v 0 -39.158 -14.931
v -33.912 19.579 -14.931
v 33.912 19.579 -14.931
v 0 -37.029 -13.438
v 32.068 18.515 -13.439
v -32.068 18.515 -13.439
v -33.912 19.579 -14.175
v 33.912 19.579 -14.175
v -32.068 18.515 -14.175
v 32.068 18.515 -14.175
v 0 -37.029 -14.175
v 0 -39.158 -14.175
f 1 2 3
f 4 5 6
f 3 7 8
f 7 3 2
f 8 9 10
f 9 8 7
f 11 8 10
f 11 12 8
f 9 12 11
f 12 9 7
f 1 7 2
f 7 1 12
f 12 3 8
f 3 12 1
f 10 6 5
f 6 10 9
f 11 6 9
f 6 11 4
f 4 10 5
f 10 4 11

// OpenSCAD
arete = 73.515;
paroi = 1.5;
echelleReductionAjustementBouchon = 0.972;
r = 0.19; // résolution d'impression sur l'axe Z
tetra_sch = [3,3];
Cpi = 3.14159;
Cphi = (1+sqrt(5))/2;
Cepsilon = 0.00000001;

function tetra_ext_radius(a) =
    a/4*sqrt(6);

function tetra_int_radius(a) =
    a/12*sqrt(6);

function tetra_arete_from(radius) =
    radius*12/sqrt(6);

externalRadius = tetra_ext_radius(arete);
internalRadius = tetra_ext_radius(
                    tetra_arete_from(
                        tetra_int_radius(arete)-paroi));

echo(externalRadius);
echo(internalRadius);

//tetrahedron(arete);
//tetra_creux();
//decoupe_bouchon();
//corps_ouvert();
bouchon();
//trou();

module corps_ouvert() {
	difference() {
		tetra_creux();
		decoupe_bouchon();
	}
}

module bouchon() {
//    rotate([180, 0, 0])
	scale([echelleReductionAjustementBouchon, echelleReductionAjustementBouchon, 0.995])
	difference () {
        intersection() {
            tetra_creux();
            decoupe_bouchon(echelleReductionAjustementBouchon);
        }
	}
}

module tetra_creux() {
	difference() {
        tetrahedron(externalRadius);
        tetrahedron(internalRadius);
	}
}

module decoupe_bouchon(scale=1) {
    distance = tetra_int_radius(arete);
	rotate([0,0,30]) translate([0,0,-distance-2*r])
		cylinder(6*r, r=arete*0.548, $fn=3);
	rotate([0,0,30]) translate([0,0,-distance])
		cylinder(8*r, r=(arete-paroi)*0.529, $fn=3);
}


module tetrahedron(rad) {
    // create an instance of a spherical coordinate
    // long - rotation around z -axis
    // lat - latitude, starting at 0 == 'north pole'
    // rad - distance from center
    function sph(long, lat, rad=1) = [long, lat, rad];

    // Convert spherical to cartesian
    function sph_to_cart(s) = [
	clean(s[2]*sin(s[1])*cos(s[0])),

	clean(s[2]*sin(s[1])*sin(s[0])),

	clean(s[2]*cos(s[1]))
	];

    function sphu_from_cart(c, rad=1) = sph(
        atan2(c[1],c[0]),
        atan2(sqrt(c[0]*c[0]+c[1]*c[1]), c[2]),
        rad
        );

    tetra_cart = [
        [+1, +1, +1],
        [-1, -1, +1],
        [-1, +1, -1],
        [+1, -1, -1]
    ];

    function tetra_unit(rad=1) = [
        sph_to_cart(sphu_from_cart(tetra_cart[0], rad)),
        sph_to_cart(sphu_from_cart(tetra_cart[1], rad)),
        sph_to_cart(sphu_from_cart(tetra_cart[2], rad)),
        sph_to_cart(sphu_from_cart(tetra_cart[3], rad)),
        ];


    tetrafaces = [
        [0, 3, 1],
        [0,1,2],
        [2,1,3],
        [0,2,3]
    ];

    tetra_edges = [
        [0,1],
        [0,2],
        [0,3],
        [1,2],
        [1,3],
        [2,3],
        ];

    rotate([54.735, 0, 0])
    rotate([0, 0, 45])
    polyhedron(tetra_unit(rad), faces=tetrafaces);
}
//translate([0, 0, -17.7])
//cylinder(5,40,40);

function clean(n) = (n < 0) ? ((n < -Cepsilon) ? n : 0) :
	(n < Cepsilon) ? 0 : n;

function plat_dihedral(pq) = 2 * asin( cos(180/pq[1])/sin(180/pq[0]));

function plat_circumradius(pq, a) =
	(a/2)*
	tan(Cpi/pq[1])*
	tan(plat_dihedral(pq)/2);

function plat_midradius(pq, a) =
	(a/2)*
	cos(Cpi/pq[0])*
	tan(plat_dihedral(pq)/2);

function plat_inradius(pq,a) =
	a/(2*tan(Cpi/pq[0]))*
	sqrt((1-cos(plat_dihedral(pq)))/(1+cos(plat_dihedral(pq))));

function plat_a_from_inradius(pq, inradius) =
    inradius*(2*tan(Cpi/pq[0]))/
	sqrt((1-cos(plat_dihedral(pq)))/(1+cos(plat_dihedral(pq))));
